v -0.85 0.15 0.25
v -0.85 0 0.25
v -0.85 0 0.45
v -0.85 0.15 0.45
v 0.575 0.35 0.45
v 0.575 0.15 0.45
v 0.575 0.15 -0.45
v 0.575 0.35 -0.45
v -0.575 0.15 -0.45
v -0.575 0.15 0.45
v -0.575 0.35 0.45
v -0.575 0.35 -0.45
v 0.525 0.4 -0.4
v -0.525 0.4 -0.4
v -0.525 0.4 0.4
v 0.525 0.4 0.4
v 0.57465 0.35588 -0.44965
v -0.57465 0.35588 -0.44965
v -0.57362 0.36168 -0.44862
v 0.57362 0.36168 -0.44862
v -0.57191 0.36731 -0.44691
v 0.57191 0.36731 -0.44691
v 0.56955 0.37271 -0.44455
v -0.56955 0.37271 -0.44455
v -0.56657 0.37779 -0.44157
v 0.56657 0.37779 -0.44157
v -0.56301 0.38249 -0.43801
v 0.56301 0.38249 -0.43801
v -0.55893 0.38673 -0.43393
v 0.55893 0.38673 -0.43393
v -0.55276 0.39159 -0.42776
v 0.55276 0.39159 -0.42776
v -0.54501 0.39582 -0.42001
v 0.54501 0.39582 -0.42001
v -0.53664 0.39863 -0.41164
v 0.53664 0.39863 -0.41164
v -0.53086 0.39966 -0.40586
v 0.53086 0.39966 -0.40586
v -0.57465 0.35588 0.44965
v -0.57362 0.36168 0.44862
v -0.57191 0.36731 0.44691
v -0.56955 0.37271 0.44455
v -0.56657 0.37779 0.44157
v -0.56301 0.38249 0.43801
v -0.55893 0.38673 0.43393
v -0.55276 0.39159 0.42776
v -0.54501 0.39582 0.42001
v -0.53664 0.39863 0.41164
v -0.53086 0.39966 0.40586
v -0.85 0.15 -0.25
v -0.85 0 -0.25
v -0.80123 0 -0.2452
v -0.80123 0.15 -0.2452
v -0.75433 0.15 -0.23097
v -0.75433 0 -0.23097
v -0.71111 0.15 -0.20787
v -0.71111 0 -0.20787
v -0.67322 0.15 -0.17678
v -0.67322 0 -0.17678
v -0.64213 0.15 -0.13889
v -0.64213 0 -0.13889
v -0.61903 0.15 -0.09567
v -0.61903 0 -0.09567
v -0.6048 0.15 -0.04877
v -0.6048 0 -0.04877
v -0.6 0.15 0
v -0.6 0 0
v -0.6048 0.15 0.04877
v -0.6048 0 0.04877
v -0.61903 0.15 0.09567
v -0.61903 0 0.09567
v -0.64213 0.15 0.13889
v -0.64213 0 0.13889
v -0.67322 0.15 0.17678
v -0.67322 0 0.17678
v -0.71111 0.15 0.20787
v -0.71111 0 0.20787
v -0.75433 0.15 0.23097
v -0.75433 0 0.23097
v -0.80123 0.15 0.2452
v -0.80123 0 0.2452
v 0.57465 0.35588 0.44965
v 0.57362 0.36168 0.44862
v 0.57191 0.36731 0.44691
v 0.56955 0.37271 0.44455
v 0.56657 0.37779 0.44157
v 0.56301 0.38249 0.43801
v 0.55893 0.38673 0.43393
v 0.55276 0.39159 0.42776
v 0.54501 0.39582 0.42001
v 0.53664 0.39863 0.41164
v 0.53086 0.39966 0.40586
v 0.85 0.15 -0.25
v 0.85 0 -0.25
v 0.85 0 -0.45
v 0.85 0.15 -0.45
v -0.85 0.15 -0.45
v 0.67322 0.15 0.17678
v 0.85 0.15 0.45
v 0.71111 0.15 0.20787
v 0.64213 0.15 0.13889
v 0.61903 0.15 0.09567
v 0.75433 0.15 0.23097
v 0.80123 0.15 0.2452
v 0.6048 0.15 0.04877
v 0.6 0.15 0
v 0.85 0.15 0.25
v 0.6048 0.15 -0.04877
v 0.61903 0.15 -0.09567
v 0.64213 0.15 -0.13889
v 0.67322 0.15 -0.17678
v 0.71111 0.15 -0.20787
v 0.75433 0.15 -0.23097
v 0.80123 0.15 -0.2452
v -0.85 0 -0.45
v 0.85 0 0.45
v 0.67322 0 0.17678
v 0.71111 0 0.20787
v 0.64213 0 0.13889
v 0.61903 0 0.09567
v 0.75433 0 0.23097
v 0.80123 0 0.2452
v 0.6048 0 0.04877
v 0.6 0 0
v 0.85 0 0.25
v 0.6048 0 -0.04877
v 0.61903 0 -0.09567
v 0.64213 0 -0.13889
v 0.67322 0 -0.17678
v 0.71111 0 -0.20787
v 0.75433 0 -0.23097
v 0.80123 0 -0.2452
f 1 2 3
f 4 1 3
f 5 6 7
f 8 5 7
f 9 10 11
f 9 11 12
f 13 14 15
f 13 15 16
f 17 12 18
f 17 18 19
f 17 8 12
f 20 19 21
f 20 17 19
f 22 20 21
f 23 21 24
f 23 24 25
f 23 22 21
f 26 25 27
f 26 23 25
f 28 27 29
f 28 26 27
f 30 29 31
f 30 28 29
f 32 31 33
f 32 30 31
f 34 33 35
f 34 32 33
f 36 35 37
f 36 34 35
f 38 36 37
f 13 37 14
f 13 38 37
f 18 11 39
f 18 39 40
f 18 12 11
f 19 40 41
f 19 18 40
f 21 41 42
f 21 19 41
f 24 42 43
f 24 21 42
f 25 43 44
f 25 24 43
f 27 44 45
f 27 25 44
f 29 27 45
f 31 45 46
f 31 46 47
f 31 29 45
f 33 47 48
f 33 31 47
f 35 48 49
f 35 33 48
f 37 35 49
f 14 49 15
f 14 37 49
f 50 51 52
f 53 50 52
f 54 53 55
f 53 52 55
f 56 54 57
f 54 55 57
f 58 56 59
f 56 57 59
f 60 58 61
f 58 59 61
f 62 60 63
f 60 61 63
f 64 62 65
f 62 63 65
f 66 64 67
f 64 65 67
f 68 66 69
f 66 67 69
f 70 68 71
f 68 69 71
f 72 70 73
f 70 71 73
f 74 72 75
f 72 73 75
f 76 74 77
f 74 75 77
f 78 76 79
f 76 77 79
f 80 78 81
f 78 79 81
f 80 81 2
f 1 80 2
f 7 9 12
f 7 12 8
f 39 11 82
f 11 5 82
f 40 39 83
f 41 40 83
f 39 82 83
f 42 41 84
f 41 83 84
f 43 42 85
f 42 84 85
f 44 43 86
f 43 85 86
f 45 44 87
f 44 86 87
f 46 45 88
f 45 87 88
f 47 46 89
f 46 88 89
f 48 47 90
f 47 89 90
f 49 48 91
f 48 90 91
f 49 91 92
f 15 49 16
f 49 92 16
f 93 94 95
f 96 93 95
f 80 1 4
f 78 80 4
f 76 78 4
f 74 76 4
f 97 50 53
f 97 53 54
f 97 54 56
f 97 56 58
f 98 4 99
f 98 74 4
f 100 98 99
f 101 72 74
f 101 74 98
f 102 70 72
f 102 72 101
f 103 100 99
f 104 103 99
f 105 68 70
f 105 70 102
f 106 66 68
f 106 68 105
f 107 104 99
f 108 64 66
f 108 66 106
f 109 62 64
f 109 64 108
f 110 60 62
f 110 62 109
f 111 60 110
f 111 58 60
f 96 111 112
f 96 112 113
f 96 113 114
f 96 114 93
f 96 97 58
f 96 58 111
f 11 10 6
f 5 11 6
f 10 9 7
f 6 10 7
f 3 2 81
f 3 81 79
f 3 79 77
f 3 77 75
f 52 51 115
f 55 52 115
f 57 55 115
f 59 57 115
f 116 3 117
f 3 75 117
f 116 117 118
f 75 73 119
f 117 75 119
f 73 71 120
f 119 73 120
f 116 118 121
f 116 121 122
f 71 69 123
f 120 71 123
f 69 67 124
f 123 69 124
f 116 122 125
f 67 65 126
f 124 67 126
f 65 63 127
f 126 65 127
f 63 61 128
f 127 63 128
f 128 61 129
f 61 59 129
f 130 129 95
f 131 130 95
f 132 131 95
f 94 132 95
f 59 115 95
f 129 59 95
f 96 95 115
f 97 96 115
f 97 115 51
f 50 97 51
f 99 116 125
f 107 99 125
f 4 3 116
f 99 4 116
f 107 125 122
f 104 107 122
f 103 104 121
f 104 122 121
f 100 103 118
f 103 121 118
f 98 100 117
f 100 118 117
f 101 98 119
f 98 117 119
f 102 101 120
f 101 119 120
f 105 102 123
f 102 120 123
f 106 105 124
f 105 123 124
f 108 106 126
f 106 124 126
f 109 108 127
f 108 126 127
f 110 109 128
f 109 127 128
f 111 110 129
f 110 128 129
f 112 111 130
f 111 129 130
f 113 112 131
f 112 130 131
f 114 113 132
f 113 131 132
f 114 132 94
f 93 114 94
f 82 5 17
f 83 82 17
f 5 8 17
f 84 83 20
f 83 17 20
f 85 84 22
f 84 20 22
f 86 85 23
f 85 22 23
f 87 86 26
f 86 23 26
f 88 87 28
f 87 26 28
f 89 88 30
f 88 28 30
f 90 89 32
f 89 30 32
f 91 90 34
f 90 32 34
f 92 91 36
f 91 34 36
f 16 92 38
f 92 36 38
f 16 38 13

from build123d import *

# Parameters (mm, degrees)
BOSS_EXTRUDE1_DEPTH = 0.15
SKETCH2_W           = 1.15
SKETCH2_H           = 0.9
BOSS_EXTRUDE2_DEPTH = 0.25
FILLET1_R           = 0.05


with BuildPart() as part:
    # Sketch1 → Boss-Extrude1 (new body)
    with BuildSketch(Plane(origin=(0, 0, 0), x_dir=(1, 0, 0), z_dir=(0, 1, 0))):
        with BuildLine():
            Line((-0.85, -0.45), (0.85, -0.45))
            Line((0.85, -0.45), (0.85, -0.25))
            ThreePointArc((0.85, -0.25), (0.6, 0), (0.85, 0.25))
            Line((0.85, 0.25), (0.85, 0.45))
            Line((0.85, 0.45), (-0.85, 0.45))
            Line((-0.85, 0.45), (-0.85, 0.25))
            ThreePointArc((-0.85, 0.25), (-0.6, 0), (-0.85, -0.25))
            Line((-0.85, -0.25), (-0.85, -0.45))
        make_face()
    extrude(amount=BOSS_EXTRUDE1_DEPTH)


with BuildPart() as body_2:
    # Sketch2 → Boss-Extrude2 (new body)
    with BuildSketch(Plane(origin=(0, 0.15, 0), x_dir=(1, 0, 0), z_dir=(0, 1, 0))):
        Rectangle(SKETCH2_W, SKETCH2_H)
    extrude(amount=BOSS_EXTRUDE2_DEPTH)

    # Fillet1
    fillet1_edges = [body_2.edges().sort_by_distance(p)[0] for p in [
        (0.575, 0.4, 0),
        (0, 0.4, -0.45),
        (-0.575, 0.4, 0),
        (0, 0.4, 0.45),
    ]]
    fillet(fillet1_edges, radius=FILLET1_R)


solid = Compound([part.part, body_2.part])
